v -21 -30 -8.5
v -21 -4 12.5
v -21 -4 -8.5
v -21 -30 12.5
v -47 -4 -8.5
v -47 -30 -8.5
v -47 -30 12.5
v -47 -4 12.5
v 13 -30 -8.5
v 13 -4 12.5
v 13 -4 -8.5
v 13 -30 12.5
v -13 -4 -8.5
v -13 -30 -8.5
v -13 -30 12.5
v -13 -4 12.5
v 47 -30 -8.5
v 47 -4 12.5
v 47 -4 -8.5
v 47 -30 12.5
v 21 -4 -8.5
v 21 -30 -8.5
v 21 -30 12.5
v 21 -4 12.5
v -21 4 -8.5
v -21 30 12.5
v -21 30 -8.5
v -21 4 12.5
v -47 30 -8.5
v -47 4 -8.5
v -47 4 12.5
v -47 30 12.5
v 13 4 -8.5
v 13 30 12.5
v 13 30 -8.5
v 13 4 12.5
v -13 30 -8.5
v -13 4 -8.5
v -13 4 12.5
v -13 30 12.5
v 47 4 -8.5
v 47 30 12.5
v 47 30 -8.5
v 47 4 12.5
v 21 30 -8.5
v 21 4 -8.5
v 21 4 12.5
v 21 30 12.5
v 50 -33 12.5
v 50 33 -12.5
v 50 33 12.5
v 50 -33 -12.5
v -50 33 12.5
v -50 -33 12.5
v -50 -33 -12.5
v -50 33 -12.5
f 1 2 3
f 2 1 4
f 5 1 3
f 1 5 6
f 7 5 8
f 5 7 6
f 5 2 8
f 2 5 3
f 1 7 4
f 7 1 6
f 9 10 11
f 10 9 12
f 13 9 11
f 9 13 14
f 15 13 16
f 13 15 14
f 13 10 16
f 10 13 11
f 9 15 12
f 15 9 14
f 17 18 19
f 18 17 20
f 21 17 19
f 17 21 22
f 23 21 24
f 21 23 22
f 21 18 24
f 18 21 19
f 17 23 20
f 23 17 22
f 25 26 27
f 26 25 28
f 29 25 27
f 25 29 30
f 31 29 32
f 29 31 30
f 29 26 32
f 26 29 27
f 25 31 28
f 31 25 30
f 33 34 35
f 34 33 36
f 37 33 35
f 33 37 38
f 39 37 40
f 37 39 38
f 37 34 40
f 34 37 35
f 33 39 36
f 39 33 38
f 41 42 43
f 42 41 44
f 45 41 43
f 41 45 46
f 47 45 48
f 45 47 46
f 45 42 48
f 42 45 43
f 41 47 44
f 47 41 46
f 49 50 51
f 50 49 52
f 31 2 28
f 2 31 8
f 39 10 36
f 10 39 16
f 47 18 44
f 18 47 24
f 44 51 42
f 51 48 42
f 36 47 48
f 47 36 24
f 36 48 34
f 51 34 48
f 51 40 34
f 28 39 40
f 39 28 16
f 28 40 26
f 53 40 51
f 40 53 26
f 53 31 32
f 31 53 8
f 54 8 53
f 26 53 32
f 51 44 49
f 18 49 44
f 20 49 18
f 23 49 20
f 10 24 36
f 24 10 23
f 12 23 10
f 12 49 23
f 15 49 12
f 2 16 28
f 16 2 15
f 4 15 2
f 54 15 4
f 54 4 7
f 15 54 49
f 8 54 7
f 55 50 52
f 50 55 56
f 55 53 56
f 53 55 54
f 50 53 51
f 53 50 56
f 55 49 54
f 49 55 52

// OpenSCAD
$fn = 32;

// ----------------------------------------------------------------------
// Pocket plate 100 x 66 x 25
// 2 x 3 pockets 26 mm square, 21 mm deep
// ----------------------------------------------------------------------

// --- parameters (mm) ---
thickness = 25;  // plate thickness
floor_t = 4;     // material left under each pocket
pocket = 26;     // pocket side length
pitch_x = 34;    // pocket pitch along X
pitch_y = 34;    // pocket pitch along Y
cols = 3;        // pockets per row
rows = 2;        // rows of pockets

// --- derived feature positions (mm) ---
depth = thickness - floor_t;        // = 21   pocket depth, down to the floor
span_x = (cols - 1) * pitch_x;      // = 68   distance between outer pockets
span_y = (rows - 1) * pitch_y;      // = 34   distance between outer pocket rows
origin_x = -span_x / 2;             // = -34   X of the first pocket
origin_y = -span_y / 2;             // = -17   Y of the first pocket
plate = [span_x + pocket + 6, span_y + pocket + 6, thickness];  // = [100, 66, 25]   overall size: pockets plus 3 mm of wall on each side
feature_centers = [
  [origin_x + 0 * pitch_x, origin_y + 0 * pitch_y],
  [origin_x + 1 * pitch_x, origin_y + 0 * pitch_y],
  [origin_x + 2 * pitch_x, origin_y + 0 * pitch_y],
  [origin_x + 0 * pitch_x, origin_y + 1 * pitch_y],
  [origin_x + 1 * pitch_x, origin_y + 1 * pitch_y],
  [origin_x + 2 * pitch_x, origin_y + 1 * pitch_y]
];   // pocket centres, used verbatim by the cutter loop

// plate outline, then one pocket per centre in feature_centers
difference() {
  cube(plate, center = true);
  for (centre = feature_centers)
    translate([centre[0] - pocket / 2, centre[1] - pocket / 2, plate[2] / 2 - depth])
      cube([pocket, pocket, depth + 1]);  // centred on the declared pocket centre
}
